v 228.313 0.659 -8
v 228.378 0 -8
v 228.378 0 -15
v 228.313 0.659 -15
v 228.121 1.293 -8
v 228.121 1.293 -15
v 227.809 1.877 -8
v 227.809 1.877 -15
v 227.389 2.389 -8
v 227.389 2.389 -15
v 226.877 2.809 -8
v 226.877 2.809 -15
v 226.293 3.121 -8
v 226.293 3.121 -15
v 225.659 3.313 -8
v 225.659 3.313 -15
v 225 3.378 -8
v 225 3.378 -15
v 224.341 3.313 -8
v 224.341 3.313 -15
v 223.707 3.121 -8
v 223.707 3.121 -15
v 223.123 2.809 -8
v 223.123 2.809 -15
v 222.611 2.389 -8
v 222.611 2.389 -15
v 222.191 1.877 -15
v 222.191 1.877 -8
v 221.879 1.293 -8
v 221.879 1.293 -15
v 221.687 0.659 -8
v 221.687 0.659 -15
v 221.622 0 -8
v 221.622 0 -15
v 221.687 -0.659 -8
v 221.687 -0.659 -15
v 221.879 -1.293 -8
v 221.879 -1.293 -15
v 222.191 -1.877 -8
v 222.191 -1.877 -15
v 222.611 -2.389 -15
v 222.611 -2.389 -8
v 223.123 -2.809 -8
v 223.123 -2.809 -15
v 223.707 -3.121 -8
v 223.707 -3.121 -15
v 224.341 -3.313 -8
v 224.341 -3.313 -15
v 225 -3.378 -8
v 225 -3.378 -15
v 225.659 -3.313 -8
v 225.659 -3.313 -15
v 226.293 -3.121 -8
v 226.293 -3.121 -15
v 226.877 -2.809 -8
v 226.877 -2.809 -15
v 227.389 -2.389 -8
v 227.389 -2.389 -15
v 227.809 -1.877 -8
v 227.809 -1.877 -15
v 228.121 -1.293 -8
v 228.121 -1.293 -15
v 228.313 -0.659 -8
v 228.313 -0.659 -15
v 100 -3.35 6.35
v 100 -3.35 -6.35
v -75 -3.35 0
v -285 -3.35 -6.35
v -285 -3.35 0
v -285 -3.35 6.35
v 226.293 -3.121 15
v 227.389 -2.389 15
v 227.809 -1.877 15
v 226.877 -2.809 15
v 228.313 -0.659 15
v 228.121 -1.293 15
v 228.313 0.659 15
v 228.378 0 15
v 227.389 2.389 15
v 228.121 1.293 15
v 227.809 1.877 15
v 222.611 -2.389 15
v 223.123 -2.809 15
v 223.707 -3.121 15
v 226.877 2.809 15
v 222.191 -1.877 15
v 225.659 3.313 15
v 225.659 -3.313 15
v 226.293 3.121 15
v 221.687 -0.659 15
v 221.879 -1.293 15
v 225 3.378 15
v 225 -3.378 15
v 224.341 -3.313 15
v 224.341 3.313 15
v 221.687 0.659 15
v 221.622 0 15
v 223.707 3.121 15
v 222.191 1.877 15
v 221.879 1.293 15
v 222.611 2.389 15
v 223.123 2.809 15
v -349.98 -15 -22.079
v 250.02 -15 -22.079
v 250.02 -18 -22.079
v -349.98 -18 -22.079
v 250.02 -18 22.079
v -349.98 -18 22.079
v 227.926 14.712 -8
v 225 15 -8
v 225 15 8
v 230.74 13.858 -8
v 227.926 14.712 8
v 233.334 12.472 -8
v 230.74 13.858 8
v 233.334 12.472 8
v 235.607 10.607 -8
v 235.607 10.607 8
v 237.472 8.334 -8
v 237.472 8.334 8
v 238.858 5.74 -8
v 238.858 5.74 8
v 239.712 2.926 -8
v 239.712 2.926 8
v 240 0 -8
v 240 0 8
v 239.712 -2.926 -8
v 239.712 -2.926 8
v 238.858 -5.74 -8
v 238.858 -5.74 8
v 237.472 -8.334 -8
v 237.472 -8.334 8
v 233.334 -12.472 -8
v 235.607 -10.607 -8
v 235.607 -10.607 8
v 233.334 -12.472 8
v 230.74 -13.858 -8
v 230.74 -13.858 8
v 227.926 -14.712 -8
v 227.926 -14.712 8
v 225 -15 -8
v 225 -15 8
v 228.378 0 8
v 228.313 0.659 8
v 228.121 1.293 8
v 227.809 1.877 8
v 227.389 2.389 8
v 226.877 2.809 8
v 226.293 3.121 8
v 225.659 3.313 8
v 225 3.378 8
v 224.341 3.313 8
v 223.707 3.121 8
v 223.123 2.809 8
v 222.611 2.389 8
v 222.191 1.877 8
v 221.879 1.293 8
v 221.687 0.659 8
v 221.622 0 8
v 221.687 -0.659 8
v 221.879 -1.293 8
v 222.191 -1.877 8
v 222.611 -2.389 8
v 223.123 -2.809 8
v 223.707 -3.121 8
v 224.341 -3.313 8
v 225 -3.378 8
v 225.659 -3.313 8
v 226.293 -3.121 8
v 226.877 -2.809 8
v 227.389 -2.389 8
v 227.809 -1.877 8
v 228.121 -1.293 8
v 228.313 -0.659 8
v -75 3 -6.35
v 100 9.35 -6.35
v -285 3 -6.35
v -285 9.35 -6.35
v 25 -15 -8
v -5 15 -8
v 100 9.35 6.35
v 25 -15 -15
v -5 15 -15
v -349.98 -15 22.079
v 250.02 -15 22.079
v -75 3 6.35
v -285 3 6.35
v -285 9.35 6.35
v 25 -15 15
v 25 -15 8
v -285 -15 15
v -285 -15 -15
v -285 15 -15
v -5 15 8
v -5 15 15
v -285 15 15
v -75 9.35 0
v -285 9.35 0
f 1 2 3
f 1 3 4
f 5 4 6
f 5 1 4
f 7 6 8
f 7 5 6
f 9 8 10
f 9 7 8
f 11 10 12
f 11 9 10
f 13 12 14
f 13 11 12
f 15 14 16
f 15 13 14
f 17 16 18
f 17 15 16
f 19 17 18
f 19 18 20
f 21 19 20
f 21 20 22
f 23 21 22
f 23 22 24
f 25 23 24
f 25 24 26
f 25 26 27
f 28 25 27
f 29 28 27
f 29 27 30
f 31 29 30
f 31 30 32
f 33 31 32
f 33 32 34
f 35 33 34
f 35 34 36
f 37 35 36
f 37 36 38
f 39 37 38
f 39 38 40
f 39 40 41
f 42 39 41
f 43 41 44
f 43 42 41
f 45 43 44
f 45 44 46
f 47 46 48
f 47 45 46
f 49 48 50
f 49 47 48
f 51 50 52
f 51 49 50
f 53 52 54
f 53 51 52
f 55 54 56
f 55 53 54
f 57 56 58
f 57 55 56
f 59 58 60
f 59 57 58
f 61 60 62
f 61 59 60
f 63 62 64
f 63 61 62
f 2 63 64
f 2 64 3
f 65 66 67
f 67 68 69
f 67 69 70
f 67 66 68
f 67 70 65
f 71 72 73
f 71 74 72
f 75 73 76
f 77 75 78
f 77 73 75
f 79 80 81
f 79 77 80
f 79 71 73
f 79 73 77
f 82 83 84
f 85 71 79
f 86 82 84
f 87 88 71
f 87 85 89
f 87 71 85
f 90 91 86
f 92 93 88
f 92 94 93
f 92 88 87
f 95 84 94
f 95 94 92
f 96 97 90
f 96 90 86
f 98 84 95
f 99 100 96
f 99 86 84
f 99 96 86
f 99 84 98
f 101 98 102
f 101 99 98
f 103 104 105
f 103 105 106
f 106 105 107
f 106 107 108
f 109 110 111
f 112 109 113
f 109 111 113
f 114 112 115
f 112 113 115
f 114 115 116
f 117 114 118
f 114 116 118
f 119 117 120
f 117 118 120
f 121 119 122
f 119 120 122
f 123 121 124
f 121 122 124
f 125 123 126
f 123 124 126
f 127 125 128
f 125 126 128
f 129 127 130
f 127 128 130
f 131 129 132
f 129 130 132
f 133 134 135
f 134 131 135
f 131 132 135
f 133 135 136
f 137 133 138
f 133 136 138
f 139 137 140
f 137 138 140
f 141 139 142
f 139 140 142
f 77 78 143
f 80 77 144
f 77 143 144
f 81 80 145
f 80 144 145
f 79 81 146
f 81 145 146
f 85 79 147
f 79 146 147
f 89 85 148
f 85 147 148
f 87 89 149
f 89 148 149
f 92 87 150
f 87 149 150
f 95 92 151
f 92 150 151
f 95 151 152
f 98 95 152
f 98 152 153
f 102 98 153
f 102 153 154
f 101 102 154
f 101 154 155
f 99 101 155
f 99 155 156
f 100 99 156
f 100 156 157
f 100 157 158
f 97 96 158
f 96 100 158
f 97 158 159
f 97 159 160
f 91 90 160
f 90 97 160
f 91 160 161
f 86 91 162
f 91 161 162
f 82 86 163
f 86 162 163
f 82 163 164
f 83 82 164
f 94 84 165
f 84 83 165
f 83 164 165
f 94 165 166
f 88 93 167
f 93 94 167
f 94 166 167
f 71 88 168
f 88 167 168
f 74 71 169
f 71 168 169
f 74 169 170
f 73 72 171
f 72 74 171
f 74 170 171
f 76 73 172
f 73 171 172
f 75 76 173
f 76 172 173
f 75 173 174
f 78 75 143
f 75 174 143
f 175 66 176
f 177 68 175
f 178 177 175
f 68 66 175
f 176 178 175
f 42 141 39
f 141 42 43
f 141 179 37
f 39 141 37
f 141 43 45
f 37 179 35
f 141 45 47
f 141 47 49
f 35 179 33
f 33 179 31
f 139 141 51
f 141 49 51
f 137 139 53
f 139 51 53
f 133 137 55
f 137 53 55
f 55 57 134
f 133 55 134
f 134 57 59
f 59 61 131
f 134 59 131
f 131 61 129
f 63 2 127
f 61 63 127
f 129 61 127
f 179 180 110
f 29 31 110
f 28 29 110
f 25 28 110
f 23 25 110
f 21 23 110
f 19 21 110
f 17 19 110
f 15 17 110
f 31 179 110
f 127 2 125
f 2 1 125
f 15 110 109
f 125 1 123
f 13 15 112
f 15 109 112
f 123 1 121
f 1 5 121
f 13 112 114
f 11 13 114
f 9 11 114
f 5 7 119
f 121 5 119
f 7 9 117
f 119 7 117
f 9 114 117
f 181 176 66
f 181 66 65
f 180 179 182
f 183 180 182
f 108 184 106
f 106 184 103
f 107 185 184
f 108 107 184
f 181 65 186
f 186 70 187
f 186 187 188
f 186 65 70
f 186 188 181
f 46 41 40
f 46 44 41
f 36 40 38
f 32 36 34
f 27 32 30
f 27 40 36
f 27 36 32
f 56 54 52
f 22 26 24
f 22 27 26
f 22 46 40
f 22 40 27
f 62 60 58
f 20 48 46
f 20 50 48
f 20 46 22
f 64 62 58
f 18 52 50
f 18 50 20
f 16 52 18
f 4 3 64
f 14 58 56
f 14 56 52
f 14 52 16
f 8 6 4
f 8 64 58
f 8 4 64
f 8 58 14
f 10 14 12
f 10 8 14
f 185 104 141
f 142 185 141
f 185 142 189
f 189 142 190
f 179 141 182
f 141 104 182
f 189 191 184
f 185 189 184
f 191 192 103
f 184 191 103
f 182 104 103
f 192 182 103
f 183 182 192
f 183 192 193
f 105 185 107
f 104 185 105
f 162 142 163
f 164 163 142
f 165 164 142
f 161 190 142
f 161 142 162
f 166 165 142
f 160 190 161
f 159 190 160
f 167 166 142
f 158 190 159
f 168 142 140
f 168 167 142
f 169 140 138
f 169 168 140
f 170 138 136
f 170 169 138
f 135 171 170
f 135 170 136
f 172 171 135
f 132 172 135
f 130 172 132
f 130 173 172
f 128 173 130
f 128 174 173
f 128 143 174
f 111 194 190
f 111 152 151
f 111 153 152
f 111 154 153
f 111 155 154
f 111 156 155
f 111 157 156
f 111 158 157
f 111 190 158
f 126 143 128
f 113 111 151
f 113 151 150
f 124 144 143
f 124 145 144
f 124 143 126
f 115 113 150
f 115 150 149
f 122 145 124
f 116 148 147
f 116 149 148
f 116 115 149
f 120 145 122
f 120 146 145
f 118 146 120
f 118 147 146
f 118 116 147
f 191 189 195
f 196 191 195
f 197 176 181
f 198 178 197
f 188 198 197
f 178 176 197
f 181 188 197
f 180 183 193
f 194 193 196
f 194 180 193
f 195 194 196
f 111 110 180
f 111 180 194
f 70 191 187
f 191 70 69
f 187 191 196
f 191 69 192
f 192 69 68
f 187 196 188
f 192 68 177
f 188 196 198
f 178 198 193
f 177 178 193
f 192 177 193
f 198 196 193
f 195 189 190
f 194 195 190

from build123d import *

# Parameters (mm, degrees)
BOSS_EXTRUDE1_DEPTH             = 15
H_0_266_DIAMETER_HOLE1_D        = 6.7564
SKETCH5_W                       = 40
SKETCH5_H                       = 16
SKETCH5_W_2                     = 232
SKETCH5_H_2                     = 20.916111238
CUT_EXTRUDE1_DEPTH              = 243.332416321
SKETCH6_W                       = 237.036778435
SKETCH6_H                       = 127.431795429
CUT_EXTRUDE2_DEPTH              = 243.332416321
SKETCH10_W                      = 30
SKETCH10_H                      = 30
BOSS_EXTRUDE3_DEPTH             = 300
SKETCH11_R                      = 6.35
CUT_EXTRUDE4_DEPTH              = 400
SKETCH13_W                      = 600
SKETCH13_H                      = 44.158972604
BOSS_EXTRUDE4_DEPTH             = 3
SKETCH14_W                      = 268.104744415
SKETCH14_H                      = 124.61591485
CUT_EXTRUDE5_DEPTH              = 30
SKETCH15_W                      = 12.7
SKETCH15_H                      = 12.7
CUT_EXTRUDE6_DEPTH              = 385
BOSS_EXTRUDE5_REACH             = 353.137
SKETCH16_R                      = 3.3782
BOSS_EXTRUDE5_DIRECTION_2_REACH = 353.137
CHAMFER1_SIZE                   = 30


with BuildPart() as part:
    # Sketch1 → Boss-Extrude1 (new, symmetric)
    with BuildSketch(Plane.XY):
        with BuildLine():
            Line((-225, 15), (225, 15))
            ThreePointArc((225, 15), (240, 0), (225, -15))
            Line((225, -15), (-225, -15))
            ThreePointArc((-225, -15), (-240, 0), (-225, 15))
        make_face()
    extrude(amount=BOSS_EXTRUDE1_DEPTH, both=True)

    # H (0.266) Diameter Hole1 (through all)
    with Locations(Plane.XY.offset(15)):
        with Locations((-225, 0), (225, 0)):
            Hole(H_0_266_DIAMETER_HOLE1_D / 2)

    # Sketch5 → Cut-Extrude1 (cut, through all)
    with BuildSketch(Plane(origin=(0, 15, 0), x_dir=(1, 0, 0), z_dir=(0, 1, 0))):
        with Locations((-237, 0)):
            Rectangle(SKETCH5_W, SKETCH5_H)
        with Locations((141, 18.458055619)):
            Rectangle(SKETCH5_W_2, SKETCH5_H_2)
        with Locations((141, -18.458055619)):
            Rectangle(SKETCH5_W_2, SKETCH5_H_2)
    extrude(amount=-CUT_EXTRUDE1_DEPTH, mode=Mode.SUBTRACT)

    # Sketch6 → Cut-Extrude2 (cut, through all)
    with BuildSketch(Plane(origin=(0, 15, 0), x_dir=(1, 0, 0), z_dir=(0, 1, 0))):
        with Locations((-293.518389218, -4.674139215)):
            Rectangle(SKETCH6_W, SKETCH6_H)
    extrude(amount=-CUT_EXTRUDE2_DEPTH, mode=Mode.SUBTRACT)

    # Sketch10 → Boss-Extrude3 (add)
    with BuildSketch(Plane.ZY.offset(175)):
        Rectangle(SKETCH10_W, SKETCH10_H)
    extrude(amount=BOSS_EXTRUDE3_DEPTH)

    # Sketch11 → Cut-Extrude4 (cut)
    with BuildSketch(Plane.ZY.offset(475)):
        with Locations((0, 3)):
            Circle(SKETCH11_R)
    extrude(amount=-CUT_EXTRUDE4_DEPTH, mode=Mode.SUBTRACT)

    # Sketch13 → Boss-Extrude4 (add)
    with BuildSketch(Plane(origin=(0, -15, 0), x_dir=(-1, 0, 0), z_dir=(0, -1, 0))):
        with Locations((49.98, 0)):
            Rectangle(SKETCH13_W, SKETCH13_H)
    extrude(amount=BOSS_EXTRUDE4_DEPTH)

    # Sketch14 → Cut-Extrude5 (cut)
    with BuildSketch(Plane(origin=(0, 15, 0), x_dir=(1, 0, 0), z_dir=(0, 1, 0))):
        with Locations((-419.052372208, 3.913950599)):
            Rectangle(SKETCH14_W, SKETCH14_H)
    extrude(amount=-CUT_EXTRUDE5_DEPTH, mode=Mode.SUBTRACT)

    # Sketch15 → Cut-Extrude6 (cut)
    with BuildSketch(Plane.ZY.offset(285)):
        with Locations((0, 3)):
            Rectangle(SKETCH15_W, SKETCH15_H)
    extrude(amount=-CUT_EXTRUDE6_DEPTH, mode=Mode.SUBTRACT)

    # Boss-Extrude5: up to this face of the body (flat: up to its plane)
    boss_extrude5_end = Plane(part.part.faces().sort_by_distance((-130, 0, 15))[0])
    # Sketch16 → Boss-Extrude5 (add, up to the picked face)
    with BuildSketch(Plane.XY, mode=Mode.PRIVATE) as boss_extrude5_sk1:
        with Locations((225, 0)):
            Circle(SKETCH16_R)
    boss_extrude5_tool1 = split(extrude(boss_extrude5_sk1.sketch, amount=BOSS_EXTRUDE5_REACH, mode=Mode.PRIVATE), bisect_by=boss_extrude5_end, keep=Keep.BOTH, mode=Mode.PRIVATE)
    add(boss_extrude5_tool1.solids().sort_by(Axis((225, 0, 0), (0, 0, 1)))[0])

    # Boss-Extrude5 direction 2: up to this face of the body (flat: up to its plane)
    boss_extrude5_direction_2_end = Plane(part.part.faces().sort_by_distance((-130, 0, -15))[0])
    # Sketch16 → Boss-Extrude5 direction 2 (add, up to the picked face)
    with BuildSketch(Plane.XY, mode=Mode.PRIVATE) as boss_extrude5_direction_2_sk1:
        with Locations((225, 0)):
            Circle(SKETCH16_R)
    boss_extrude5_direction_2_tool1 = split(extrude(boss_extrude5_direction_2_sk1.sketch, amount=-BOSS_EXTRUDE5_DIRECTION_2_REACH, mode=Mode.PRIVATE), bisect_by=boss_extrude5_direction_2_end, keep=Keep.BOTH, mode=Mode.PRIVATE)
    add(boss_extrude5_direction_2_tool1.solids().sort_by(Axis((225, 0, 0), (0, 0, -1)))[0])

    # Chamfer1
    chamfer1_edges = [part.edges().sort_by_distance(p)[0] for p in [
        (25, 15, 11.5),
        (25, 15, -11.5),
    ]]
    chamfer(chamfer1_edges, length=CHAMFER1_SIZE - 0.0001)  # a hair under: the kernel refuses the full size


solid = part.part
